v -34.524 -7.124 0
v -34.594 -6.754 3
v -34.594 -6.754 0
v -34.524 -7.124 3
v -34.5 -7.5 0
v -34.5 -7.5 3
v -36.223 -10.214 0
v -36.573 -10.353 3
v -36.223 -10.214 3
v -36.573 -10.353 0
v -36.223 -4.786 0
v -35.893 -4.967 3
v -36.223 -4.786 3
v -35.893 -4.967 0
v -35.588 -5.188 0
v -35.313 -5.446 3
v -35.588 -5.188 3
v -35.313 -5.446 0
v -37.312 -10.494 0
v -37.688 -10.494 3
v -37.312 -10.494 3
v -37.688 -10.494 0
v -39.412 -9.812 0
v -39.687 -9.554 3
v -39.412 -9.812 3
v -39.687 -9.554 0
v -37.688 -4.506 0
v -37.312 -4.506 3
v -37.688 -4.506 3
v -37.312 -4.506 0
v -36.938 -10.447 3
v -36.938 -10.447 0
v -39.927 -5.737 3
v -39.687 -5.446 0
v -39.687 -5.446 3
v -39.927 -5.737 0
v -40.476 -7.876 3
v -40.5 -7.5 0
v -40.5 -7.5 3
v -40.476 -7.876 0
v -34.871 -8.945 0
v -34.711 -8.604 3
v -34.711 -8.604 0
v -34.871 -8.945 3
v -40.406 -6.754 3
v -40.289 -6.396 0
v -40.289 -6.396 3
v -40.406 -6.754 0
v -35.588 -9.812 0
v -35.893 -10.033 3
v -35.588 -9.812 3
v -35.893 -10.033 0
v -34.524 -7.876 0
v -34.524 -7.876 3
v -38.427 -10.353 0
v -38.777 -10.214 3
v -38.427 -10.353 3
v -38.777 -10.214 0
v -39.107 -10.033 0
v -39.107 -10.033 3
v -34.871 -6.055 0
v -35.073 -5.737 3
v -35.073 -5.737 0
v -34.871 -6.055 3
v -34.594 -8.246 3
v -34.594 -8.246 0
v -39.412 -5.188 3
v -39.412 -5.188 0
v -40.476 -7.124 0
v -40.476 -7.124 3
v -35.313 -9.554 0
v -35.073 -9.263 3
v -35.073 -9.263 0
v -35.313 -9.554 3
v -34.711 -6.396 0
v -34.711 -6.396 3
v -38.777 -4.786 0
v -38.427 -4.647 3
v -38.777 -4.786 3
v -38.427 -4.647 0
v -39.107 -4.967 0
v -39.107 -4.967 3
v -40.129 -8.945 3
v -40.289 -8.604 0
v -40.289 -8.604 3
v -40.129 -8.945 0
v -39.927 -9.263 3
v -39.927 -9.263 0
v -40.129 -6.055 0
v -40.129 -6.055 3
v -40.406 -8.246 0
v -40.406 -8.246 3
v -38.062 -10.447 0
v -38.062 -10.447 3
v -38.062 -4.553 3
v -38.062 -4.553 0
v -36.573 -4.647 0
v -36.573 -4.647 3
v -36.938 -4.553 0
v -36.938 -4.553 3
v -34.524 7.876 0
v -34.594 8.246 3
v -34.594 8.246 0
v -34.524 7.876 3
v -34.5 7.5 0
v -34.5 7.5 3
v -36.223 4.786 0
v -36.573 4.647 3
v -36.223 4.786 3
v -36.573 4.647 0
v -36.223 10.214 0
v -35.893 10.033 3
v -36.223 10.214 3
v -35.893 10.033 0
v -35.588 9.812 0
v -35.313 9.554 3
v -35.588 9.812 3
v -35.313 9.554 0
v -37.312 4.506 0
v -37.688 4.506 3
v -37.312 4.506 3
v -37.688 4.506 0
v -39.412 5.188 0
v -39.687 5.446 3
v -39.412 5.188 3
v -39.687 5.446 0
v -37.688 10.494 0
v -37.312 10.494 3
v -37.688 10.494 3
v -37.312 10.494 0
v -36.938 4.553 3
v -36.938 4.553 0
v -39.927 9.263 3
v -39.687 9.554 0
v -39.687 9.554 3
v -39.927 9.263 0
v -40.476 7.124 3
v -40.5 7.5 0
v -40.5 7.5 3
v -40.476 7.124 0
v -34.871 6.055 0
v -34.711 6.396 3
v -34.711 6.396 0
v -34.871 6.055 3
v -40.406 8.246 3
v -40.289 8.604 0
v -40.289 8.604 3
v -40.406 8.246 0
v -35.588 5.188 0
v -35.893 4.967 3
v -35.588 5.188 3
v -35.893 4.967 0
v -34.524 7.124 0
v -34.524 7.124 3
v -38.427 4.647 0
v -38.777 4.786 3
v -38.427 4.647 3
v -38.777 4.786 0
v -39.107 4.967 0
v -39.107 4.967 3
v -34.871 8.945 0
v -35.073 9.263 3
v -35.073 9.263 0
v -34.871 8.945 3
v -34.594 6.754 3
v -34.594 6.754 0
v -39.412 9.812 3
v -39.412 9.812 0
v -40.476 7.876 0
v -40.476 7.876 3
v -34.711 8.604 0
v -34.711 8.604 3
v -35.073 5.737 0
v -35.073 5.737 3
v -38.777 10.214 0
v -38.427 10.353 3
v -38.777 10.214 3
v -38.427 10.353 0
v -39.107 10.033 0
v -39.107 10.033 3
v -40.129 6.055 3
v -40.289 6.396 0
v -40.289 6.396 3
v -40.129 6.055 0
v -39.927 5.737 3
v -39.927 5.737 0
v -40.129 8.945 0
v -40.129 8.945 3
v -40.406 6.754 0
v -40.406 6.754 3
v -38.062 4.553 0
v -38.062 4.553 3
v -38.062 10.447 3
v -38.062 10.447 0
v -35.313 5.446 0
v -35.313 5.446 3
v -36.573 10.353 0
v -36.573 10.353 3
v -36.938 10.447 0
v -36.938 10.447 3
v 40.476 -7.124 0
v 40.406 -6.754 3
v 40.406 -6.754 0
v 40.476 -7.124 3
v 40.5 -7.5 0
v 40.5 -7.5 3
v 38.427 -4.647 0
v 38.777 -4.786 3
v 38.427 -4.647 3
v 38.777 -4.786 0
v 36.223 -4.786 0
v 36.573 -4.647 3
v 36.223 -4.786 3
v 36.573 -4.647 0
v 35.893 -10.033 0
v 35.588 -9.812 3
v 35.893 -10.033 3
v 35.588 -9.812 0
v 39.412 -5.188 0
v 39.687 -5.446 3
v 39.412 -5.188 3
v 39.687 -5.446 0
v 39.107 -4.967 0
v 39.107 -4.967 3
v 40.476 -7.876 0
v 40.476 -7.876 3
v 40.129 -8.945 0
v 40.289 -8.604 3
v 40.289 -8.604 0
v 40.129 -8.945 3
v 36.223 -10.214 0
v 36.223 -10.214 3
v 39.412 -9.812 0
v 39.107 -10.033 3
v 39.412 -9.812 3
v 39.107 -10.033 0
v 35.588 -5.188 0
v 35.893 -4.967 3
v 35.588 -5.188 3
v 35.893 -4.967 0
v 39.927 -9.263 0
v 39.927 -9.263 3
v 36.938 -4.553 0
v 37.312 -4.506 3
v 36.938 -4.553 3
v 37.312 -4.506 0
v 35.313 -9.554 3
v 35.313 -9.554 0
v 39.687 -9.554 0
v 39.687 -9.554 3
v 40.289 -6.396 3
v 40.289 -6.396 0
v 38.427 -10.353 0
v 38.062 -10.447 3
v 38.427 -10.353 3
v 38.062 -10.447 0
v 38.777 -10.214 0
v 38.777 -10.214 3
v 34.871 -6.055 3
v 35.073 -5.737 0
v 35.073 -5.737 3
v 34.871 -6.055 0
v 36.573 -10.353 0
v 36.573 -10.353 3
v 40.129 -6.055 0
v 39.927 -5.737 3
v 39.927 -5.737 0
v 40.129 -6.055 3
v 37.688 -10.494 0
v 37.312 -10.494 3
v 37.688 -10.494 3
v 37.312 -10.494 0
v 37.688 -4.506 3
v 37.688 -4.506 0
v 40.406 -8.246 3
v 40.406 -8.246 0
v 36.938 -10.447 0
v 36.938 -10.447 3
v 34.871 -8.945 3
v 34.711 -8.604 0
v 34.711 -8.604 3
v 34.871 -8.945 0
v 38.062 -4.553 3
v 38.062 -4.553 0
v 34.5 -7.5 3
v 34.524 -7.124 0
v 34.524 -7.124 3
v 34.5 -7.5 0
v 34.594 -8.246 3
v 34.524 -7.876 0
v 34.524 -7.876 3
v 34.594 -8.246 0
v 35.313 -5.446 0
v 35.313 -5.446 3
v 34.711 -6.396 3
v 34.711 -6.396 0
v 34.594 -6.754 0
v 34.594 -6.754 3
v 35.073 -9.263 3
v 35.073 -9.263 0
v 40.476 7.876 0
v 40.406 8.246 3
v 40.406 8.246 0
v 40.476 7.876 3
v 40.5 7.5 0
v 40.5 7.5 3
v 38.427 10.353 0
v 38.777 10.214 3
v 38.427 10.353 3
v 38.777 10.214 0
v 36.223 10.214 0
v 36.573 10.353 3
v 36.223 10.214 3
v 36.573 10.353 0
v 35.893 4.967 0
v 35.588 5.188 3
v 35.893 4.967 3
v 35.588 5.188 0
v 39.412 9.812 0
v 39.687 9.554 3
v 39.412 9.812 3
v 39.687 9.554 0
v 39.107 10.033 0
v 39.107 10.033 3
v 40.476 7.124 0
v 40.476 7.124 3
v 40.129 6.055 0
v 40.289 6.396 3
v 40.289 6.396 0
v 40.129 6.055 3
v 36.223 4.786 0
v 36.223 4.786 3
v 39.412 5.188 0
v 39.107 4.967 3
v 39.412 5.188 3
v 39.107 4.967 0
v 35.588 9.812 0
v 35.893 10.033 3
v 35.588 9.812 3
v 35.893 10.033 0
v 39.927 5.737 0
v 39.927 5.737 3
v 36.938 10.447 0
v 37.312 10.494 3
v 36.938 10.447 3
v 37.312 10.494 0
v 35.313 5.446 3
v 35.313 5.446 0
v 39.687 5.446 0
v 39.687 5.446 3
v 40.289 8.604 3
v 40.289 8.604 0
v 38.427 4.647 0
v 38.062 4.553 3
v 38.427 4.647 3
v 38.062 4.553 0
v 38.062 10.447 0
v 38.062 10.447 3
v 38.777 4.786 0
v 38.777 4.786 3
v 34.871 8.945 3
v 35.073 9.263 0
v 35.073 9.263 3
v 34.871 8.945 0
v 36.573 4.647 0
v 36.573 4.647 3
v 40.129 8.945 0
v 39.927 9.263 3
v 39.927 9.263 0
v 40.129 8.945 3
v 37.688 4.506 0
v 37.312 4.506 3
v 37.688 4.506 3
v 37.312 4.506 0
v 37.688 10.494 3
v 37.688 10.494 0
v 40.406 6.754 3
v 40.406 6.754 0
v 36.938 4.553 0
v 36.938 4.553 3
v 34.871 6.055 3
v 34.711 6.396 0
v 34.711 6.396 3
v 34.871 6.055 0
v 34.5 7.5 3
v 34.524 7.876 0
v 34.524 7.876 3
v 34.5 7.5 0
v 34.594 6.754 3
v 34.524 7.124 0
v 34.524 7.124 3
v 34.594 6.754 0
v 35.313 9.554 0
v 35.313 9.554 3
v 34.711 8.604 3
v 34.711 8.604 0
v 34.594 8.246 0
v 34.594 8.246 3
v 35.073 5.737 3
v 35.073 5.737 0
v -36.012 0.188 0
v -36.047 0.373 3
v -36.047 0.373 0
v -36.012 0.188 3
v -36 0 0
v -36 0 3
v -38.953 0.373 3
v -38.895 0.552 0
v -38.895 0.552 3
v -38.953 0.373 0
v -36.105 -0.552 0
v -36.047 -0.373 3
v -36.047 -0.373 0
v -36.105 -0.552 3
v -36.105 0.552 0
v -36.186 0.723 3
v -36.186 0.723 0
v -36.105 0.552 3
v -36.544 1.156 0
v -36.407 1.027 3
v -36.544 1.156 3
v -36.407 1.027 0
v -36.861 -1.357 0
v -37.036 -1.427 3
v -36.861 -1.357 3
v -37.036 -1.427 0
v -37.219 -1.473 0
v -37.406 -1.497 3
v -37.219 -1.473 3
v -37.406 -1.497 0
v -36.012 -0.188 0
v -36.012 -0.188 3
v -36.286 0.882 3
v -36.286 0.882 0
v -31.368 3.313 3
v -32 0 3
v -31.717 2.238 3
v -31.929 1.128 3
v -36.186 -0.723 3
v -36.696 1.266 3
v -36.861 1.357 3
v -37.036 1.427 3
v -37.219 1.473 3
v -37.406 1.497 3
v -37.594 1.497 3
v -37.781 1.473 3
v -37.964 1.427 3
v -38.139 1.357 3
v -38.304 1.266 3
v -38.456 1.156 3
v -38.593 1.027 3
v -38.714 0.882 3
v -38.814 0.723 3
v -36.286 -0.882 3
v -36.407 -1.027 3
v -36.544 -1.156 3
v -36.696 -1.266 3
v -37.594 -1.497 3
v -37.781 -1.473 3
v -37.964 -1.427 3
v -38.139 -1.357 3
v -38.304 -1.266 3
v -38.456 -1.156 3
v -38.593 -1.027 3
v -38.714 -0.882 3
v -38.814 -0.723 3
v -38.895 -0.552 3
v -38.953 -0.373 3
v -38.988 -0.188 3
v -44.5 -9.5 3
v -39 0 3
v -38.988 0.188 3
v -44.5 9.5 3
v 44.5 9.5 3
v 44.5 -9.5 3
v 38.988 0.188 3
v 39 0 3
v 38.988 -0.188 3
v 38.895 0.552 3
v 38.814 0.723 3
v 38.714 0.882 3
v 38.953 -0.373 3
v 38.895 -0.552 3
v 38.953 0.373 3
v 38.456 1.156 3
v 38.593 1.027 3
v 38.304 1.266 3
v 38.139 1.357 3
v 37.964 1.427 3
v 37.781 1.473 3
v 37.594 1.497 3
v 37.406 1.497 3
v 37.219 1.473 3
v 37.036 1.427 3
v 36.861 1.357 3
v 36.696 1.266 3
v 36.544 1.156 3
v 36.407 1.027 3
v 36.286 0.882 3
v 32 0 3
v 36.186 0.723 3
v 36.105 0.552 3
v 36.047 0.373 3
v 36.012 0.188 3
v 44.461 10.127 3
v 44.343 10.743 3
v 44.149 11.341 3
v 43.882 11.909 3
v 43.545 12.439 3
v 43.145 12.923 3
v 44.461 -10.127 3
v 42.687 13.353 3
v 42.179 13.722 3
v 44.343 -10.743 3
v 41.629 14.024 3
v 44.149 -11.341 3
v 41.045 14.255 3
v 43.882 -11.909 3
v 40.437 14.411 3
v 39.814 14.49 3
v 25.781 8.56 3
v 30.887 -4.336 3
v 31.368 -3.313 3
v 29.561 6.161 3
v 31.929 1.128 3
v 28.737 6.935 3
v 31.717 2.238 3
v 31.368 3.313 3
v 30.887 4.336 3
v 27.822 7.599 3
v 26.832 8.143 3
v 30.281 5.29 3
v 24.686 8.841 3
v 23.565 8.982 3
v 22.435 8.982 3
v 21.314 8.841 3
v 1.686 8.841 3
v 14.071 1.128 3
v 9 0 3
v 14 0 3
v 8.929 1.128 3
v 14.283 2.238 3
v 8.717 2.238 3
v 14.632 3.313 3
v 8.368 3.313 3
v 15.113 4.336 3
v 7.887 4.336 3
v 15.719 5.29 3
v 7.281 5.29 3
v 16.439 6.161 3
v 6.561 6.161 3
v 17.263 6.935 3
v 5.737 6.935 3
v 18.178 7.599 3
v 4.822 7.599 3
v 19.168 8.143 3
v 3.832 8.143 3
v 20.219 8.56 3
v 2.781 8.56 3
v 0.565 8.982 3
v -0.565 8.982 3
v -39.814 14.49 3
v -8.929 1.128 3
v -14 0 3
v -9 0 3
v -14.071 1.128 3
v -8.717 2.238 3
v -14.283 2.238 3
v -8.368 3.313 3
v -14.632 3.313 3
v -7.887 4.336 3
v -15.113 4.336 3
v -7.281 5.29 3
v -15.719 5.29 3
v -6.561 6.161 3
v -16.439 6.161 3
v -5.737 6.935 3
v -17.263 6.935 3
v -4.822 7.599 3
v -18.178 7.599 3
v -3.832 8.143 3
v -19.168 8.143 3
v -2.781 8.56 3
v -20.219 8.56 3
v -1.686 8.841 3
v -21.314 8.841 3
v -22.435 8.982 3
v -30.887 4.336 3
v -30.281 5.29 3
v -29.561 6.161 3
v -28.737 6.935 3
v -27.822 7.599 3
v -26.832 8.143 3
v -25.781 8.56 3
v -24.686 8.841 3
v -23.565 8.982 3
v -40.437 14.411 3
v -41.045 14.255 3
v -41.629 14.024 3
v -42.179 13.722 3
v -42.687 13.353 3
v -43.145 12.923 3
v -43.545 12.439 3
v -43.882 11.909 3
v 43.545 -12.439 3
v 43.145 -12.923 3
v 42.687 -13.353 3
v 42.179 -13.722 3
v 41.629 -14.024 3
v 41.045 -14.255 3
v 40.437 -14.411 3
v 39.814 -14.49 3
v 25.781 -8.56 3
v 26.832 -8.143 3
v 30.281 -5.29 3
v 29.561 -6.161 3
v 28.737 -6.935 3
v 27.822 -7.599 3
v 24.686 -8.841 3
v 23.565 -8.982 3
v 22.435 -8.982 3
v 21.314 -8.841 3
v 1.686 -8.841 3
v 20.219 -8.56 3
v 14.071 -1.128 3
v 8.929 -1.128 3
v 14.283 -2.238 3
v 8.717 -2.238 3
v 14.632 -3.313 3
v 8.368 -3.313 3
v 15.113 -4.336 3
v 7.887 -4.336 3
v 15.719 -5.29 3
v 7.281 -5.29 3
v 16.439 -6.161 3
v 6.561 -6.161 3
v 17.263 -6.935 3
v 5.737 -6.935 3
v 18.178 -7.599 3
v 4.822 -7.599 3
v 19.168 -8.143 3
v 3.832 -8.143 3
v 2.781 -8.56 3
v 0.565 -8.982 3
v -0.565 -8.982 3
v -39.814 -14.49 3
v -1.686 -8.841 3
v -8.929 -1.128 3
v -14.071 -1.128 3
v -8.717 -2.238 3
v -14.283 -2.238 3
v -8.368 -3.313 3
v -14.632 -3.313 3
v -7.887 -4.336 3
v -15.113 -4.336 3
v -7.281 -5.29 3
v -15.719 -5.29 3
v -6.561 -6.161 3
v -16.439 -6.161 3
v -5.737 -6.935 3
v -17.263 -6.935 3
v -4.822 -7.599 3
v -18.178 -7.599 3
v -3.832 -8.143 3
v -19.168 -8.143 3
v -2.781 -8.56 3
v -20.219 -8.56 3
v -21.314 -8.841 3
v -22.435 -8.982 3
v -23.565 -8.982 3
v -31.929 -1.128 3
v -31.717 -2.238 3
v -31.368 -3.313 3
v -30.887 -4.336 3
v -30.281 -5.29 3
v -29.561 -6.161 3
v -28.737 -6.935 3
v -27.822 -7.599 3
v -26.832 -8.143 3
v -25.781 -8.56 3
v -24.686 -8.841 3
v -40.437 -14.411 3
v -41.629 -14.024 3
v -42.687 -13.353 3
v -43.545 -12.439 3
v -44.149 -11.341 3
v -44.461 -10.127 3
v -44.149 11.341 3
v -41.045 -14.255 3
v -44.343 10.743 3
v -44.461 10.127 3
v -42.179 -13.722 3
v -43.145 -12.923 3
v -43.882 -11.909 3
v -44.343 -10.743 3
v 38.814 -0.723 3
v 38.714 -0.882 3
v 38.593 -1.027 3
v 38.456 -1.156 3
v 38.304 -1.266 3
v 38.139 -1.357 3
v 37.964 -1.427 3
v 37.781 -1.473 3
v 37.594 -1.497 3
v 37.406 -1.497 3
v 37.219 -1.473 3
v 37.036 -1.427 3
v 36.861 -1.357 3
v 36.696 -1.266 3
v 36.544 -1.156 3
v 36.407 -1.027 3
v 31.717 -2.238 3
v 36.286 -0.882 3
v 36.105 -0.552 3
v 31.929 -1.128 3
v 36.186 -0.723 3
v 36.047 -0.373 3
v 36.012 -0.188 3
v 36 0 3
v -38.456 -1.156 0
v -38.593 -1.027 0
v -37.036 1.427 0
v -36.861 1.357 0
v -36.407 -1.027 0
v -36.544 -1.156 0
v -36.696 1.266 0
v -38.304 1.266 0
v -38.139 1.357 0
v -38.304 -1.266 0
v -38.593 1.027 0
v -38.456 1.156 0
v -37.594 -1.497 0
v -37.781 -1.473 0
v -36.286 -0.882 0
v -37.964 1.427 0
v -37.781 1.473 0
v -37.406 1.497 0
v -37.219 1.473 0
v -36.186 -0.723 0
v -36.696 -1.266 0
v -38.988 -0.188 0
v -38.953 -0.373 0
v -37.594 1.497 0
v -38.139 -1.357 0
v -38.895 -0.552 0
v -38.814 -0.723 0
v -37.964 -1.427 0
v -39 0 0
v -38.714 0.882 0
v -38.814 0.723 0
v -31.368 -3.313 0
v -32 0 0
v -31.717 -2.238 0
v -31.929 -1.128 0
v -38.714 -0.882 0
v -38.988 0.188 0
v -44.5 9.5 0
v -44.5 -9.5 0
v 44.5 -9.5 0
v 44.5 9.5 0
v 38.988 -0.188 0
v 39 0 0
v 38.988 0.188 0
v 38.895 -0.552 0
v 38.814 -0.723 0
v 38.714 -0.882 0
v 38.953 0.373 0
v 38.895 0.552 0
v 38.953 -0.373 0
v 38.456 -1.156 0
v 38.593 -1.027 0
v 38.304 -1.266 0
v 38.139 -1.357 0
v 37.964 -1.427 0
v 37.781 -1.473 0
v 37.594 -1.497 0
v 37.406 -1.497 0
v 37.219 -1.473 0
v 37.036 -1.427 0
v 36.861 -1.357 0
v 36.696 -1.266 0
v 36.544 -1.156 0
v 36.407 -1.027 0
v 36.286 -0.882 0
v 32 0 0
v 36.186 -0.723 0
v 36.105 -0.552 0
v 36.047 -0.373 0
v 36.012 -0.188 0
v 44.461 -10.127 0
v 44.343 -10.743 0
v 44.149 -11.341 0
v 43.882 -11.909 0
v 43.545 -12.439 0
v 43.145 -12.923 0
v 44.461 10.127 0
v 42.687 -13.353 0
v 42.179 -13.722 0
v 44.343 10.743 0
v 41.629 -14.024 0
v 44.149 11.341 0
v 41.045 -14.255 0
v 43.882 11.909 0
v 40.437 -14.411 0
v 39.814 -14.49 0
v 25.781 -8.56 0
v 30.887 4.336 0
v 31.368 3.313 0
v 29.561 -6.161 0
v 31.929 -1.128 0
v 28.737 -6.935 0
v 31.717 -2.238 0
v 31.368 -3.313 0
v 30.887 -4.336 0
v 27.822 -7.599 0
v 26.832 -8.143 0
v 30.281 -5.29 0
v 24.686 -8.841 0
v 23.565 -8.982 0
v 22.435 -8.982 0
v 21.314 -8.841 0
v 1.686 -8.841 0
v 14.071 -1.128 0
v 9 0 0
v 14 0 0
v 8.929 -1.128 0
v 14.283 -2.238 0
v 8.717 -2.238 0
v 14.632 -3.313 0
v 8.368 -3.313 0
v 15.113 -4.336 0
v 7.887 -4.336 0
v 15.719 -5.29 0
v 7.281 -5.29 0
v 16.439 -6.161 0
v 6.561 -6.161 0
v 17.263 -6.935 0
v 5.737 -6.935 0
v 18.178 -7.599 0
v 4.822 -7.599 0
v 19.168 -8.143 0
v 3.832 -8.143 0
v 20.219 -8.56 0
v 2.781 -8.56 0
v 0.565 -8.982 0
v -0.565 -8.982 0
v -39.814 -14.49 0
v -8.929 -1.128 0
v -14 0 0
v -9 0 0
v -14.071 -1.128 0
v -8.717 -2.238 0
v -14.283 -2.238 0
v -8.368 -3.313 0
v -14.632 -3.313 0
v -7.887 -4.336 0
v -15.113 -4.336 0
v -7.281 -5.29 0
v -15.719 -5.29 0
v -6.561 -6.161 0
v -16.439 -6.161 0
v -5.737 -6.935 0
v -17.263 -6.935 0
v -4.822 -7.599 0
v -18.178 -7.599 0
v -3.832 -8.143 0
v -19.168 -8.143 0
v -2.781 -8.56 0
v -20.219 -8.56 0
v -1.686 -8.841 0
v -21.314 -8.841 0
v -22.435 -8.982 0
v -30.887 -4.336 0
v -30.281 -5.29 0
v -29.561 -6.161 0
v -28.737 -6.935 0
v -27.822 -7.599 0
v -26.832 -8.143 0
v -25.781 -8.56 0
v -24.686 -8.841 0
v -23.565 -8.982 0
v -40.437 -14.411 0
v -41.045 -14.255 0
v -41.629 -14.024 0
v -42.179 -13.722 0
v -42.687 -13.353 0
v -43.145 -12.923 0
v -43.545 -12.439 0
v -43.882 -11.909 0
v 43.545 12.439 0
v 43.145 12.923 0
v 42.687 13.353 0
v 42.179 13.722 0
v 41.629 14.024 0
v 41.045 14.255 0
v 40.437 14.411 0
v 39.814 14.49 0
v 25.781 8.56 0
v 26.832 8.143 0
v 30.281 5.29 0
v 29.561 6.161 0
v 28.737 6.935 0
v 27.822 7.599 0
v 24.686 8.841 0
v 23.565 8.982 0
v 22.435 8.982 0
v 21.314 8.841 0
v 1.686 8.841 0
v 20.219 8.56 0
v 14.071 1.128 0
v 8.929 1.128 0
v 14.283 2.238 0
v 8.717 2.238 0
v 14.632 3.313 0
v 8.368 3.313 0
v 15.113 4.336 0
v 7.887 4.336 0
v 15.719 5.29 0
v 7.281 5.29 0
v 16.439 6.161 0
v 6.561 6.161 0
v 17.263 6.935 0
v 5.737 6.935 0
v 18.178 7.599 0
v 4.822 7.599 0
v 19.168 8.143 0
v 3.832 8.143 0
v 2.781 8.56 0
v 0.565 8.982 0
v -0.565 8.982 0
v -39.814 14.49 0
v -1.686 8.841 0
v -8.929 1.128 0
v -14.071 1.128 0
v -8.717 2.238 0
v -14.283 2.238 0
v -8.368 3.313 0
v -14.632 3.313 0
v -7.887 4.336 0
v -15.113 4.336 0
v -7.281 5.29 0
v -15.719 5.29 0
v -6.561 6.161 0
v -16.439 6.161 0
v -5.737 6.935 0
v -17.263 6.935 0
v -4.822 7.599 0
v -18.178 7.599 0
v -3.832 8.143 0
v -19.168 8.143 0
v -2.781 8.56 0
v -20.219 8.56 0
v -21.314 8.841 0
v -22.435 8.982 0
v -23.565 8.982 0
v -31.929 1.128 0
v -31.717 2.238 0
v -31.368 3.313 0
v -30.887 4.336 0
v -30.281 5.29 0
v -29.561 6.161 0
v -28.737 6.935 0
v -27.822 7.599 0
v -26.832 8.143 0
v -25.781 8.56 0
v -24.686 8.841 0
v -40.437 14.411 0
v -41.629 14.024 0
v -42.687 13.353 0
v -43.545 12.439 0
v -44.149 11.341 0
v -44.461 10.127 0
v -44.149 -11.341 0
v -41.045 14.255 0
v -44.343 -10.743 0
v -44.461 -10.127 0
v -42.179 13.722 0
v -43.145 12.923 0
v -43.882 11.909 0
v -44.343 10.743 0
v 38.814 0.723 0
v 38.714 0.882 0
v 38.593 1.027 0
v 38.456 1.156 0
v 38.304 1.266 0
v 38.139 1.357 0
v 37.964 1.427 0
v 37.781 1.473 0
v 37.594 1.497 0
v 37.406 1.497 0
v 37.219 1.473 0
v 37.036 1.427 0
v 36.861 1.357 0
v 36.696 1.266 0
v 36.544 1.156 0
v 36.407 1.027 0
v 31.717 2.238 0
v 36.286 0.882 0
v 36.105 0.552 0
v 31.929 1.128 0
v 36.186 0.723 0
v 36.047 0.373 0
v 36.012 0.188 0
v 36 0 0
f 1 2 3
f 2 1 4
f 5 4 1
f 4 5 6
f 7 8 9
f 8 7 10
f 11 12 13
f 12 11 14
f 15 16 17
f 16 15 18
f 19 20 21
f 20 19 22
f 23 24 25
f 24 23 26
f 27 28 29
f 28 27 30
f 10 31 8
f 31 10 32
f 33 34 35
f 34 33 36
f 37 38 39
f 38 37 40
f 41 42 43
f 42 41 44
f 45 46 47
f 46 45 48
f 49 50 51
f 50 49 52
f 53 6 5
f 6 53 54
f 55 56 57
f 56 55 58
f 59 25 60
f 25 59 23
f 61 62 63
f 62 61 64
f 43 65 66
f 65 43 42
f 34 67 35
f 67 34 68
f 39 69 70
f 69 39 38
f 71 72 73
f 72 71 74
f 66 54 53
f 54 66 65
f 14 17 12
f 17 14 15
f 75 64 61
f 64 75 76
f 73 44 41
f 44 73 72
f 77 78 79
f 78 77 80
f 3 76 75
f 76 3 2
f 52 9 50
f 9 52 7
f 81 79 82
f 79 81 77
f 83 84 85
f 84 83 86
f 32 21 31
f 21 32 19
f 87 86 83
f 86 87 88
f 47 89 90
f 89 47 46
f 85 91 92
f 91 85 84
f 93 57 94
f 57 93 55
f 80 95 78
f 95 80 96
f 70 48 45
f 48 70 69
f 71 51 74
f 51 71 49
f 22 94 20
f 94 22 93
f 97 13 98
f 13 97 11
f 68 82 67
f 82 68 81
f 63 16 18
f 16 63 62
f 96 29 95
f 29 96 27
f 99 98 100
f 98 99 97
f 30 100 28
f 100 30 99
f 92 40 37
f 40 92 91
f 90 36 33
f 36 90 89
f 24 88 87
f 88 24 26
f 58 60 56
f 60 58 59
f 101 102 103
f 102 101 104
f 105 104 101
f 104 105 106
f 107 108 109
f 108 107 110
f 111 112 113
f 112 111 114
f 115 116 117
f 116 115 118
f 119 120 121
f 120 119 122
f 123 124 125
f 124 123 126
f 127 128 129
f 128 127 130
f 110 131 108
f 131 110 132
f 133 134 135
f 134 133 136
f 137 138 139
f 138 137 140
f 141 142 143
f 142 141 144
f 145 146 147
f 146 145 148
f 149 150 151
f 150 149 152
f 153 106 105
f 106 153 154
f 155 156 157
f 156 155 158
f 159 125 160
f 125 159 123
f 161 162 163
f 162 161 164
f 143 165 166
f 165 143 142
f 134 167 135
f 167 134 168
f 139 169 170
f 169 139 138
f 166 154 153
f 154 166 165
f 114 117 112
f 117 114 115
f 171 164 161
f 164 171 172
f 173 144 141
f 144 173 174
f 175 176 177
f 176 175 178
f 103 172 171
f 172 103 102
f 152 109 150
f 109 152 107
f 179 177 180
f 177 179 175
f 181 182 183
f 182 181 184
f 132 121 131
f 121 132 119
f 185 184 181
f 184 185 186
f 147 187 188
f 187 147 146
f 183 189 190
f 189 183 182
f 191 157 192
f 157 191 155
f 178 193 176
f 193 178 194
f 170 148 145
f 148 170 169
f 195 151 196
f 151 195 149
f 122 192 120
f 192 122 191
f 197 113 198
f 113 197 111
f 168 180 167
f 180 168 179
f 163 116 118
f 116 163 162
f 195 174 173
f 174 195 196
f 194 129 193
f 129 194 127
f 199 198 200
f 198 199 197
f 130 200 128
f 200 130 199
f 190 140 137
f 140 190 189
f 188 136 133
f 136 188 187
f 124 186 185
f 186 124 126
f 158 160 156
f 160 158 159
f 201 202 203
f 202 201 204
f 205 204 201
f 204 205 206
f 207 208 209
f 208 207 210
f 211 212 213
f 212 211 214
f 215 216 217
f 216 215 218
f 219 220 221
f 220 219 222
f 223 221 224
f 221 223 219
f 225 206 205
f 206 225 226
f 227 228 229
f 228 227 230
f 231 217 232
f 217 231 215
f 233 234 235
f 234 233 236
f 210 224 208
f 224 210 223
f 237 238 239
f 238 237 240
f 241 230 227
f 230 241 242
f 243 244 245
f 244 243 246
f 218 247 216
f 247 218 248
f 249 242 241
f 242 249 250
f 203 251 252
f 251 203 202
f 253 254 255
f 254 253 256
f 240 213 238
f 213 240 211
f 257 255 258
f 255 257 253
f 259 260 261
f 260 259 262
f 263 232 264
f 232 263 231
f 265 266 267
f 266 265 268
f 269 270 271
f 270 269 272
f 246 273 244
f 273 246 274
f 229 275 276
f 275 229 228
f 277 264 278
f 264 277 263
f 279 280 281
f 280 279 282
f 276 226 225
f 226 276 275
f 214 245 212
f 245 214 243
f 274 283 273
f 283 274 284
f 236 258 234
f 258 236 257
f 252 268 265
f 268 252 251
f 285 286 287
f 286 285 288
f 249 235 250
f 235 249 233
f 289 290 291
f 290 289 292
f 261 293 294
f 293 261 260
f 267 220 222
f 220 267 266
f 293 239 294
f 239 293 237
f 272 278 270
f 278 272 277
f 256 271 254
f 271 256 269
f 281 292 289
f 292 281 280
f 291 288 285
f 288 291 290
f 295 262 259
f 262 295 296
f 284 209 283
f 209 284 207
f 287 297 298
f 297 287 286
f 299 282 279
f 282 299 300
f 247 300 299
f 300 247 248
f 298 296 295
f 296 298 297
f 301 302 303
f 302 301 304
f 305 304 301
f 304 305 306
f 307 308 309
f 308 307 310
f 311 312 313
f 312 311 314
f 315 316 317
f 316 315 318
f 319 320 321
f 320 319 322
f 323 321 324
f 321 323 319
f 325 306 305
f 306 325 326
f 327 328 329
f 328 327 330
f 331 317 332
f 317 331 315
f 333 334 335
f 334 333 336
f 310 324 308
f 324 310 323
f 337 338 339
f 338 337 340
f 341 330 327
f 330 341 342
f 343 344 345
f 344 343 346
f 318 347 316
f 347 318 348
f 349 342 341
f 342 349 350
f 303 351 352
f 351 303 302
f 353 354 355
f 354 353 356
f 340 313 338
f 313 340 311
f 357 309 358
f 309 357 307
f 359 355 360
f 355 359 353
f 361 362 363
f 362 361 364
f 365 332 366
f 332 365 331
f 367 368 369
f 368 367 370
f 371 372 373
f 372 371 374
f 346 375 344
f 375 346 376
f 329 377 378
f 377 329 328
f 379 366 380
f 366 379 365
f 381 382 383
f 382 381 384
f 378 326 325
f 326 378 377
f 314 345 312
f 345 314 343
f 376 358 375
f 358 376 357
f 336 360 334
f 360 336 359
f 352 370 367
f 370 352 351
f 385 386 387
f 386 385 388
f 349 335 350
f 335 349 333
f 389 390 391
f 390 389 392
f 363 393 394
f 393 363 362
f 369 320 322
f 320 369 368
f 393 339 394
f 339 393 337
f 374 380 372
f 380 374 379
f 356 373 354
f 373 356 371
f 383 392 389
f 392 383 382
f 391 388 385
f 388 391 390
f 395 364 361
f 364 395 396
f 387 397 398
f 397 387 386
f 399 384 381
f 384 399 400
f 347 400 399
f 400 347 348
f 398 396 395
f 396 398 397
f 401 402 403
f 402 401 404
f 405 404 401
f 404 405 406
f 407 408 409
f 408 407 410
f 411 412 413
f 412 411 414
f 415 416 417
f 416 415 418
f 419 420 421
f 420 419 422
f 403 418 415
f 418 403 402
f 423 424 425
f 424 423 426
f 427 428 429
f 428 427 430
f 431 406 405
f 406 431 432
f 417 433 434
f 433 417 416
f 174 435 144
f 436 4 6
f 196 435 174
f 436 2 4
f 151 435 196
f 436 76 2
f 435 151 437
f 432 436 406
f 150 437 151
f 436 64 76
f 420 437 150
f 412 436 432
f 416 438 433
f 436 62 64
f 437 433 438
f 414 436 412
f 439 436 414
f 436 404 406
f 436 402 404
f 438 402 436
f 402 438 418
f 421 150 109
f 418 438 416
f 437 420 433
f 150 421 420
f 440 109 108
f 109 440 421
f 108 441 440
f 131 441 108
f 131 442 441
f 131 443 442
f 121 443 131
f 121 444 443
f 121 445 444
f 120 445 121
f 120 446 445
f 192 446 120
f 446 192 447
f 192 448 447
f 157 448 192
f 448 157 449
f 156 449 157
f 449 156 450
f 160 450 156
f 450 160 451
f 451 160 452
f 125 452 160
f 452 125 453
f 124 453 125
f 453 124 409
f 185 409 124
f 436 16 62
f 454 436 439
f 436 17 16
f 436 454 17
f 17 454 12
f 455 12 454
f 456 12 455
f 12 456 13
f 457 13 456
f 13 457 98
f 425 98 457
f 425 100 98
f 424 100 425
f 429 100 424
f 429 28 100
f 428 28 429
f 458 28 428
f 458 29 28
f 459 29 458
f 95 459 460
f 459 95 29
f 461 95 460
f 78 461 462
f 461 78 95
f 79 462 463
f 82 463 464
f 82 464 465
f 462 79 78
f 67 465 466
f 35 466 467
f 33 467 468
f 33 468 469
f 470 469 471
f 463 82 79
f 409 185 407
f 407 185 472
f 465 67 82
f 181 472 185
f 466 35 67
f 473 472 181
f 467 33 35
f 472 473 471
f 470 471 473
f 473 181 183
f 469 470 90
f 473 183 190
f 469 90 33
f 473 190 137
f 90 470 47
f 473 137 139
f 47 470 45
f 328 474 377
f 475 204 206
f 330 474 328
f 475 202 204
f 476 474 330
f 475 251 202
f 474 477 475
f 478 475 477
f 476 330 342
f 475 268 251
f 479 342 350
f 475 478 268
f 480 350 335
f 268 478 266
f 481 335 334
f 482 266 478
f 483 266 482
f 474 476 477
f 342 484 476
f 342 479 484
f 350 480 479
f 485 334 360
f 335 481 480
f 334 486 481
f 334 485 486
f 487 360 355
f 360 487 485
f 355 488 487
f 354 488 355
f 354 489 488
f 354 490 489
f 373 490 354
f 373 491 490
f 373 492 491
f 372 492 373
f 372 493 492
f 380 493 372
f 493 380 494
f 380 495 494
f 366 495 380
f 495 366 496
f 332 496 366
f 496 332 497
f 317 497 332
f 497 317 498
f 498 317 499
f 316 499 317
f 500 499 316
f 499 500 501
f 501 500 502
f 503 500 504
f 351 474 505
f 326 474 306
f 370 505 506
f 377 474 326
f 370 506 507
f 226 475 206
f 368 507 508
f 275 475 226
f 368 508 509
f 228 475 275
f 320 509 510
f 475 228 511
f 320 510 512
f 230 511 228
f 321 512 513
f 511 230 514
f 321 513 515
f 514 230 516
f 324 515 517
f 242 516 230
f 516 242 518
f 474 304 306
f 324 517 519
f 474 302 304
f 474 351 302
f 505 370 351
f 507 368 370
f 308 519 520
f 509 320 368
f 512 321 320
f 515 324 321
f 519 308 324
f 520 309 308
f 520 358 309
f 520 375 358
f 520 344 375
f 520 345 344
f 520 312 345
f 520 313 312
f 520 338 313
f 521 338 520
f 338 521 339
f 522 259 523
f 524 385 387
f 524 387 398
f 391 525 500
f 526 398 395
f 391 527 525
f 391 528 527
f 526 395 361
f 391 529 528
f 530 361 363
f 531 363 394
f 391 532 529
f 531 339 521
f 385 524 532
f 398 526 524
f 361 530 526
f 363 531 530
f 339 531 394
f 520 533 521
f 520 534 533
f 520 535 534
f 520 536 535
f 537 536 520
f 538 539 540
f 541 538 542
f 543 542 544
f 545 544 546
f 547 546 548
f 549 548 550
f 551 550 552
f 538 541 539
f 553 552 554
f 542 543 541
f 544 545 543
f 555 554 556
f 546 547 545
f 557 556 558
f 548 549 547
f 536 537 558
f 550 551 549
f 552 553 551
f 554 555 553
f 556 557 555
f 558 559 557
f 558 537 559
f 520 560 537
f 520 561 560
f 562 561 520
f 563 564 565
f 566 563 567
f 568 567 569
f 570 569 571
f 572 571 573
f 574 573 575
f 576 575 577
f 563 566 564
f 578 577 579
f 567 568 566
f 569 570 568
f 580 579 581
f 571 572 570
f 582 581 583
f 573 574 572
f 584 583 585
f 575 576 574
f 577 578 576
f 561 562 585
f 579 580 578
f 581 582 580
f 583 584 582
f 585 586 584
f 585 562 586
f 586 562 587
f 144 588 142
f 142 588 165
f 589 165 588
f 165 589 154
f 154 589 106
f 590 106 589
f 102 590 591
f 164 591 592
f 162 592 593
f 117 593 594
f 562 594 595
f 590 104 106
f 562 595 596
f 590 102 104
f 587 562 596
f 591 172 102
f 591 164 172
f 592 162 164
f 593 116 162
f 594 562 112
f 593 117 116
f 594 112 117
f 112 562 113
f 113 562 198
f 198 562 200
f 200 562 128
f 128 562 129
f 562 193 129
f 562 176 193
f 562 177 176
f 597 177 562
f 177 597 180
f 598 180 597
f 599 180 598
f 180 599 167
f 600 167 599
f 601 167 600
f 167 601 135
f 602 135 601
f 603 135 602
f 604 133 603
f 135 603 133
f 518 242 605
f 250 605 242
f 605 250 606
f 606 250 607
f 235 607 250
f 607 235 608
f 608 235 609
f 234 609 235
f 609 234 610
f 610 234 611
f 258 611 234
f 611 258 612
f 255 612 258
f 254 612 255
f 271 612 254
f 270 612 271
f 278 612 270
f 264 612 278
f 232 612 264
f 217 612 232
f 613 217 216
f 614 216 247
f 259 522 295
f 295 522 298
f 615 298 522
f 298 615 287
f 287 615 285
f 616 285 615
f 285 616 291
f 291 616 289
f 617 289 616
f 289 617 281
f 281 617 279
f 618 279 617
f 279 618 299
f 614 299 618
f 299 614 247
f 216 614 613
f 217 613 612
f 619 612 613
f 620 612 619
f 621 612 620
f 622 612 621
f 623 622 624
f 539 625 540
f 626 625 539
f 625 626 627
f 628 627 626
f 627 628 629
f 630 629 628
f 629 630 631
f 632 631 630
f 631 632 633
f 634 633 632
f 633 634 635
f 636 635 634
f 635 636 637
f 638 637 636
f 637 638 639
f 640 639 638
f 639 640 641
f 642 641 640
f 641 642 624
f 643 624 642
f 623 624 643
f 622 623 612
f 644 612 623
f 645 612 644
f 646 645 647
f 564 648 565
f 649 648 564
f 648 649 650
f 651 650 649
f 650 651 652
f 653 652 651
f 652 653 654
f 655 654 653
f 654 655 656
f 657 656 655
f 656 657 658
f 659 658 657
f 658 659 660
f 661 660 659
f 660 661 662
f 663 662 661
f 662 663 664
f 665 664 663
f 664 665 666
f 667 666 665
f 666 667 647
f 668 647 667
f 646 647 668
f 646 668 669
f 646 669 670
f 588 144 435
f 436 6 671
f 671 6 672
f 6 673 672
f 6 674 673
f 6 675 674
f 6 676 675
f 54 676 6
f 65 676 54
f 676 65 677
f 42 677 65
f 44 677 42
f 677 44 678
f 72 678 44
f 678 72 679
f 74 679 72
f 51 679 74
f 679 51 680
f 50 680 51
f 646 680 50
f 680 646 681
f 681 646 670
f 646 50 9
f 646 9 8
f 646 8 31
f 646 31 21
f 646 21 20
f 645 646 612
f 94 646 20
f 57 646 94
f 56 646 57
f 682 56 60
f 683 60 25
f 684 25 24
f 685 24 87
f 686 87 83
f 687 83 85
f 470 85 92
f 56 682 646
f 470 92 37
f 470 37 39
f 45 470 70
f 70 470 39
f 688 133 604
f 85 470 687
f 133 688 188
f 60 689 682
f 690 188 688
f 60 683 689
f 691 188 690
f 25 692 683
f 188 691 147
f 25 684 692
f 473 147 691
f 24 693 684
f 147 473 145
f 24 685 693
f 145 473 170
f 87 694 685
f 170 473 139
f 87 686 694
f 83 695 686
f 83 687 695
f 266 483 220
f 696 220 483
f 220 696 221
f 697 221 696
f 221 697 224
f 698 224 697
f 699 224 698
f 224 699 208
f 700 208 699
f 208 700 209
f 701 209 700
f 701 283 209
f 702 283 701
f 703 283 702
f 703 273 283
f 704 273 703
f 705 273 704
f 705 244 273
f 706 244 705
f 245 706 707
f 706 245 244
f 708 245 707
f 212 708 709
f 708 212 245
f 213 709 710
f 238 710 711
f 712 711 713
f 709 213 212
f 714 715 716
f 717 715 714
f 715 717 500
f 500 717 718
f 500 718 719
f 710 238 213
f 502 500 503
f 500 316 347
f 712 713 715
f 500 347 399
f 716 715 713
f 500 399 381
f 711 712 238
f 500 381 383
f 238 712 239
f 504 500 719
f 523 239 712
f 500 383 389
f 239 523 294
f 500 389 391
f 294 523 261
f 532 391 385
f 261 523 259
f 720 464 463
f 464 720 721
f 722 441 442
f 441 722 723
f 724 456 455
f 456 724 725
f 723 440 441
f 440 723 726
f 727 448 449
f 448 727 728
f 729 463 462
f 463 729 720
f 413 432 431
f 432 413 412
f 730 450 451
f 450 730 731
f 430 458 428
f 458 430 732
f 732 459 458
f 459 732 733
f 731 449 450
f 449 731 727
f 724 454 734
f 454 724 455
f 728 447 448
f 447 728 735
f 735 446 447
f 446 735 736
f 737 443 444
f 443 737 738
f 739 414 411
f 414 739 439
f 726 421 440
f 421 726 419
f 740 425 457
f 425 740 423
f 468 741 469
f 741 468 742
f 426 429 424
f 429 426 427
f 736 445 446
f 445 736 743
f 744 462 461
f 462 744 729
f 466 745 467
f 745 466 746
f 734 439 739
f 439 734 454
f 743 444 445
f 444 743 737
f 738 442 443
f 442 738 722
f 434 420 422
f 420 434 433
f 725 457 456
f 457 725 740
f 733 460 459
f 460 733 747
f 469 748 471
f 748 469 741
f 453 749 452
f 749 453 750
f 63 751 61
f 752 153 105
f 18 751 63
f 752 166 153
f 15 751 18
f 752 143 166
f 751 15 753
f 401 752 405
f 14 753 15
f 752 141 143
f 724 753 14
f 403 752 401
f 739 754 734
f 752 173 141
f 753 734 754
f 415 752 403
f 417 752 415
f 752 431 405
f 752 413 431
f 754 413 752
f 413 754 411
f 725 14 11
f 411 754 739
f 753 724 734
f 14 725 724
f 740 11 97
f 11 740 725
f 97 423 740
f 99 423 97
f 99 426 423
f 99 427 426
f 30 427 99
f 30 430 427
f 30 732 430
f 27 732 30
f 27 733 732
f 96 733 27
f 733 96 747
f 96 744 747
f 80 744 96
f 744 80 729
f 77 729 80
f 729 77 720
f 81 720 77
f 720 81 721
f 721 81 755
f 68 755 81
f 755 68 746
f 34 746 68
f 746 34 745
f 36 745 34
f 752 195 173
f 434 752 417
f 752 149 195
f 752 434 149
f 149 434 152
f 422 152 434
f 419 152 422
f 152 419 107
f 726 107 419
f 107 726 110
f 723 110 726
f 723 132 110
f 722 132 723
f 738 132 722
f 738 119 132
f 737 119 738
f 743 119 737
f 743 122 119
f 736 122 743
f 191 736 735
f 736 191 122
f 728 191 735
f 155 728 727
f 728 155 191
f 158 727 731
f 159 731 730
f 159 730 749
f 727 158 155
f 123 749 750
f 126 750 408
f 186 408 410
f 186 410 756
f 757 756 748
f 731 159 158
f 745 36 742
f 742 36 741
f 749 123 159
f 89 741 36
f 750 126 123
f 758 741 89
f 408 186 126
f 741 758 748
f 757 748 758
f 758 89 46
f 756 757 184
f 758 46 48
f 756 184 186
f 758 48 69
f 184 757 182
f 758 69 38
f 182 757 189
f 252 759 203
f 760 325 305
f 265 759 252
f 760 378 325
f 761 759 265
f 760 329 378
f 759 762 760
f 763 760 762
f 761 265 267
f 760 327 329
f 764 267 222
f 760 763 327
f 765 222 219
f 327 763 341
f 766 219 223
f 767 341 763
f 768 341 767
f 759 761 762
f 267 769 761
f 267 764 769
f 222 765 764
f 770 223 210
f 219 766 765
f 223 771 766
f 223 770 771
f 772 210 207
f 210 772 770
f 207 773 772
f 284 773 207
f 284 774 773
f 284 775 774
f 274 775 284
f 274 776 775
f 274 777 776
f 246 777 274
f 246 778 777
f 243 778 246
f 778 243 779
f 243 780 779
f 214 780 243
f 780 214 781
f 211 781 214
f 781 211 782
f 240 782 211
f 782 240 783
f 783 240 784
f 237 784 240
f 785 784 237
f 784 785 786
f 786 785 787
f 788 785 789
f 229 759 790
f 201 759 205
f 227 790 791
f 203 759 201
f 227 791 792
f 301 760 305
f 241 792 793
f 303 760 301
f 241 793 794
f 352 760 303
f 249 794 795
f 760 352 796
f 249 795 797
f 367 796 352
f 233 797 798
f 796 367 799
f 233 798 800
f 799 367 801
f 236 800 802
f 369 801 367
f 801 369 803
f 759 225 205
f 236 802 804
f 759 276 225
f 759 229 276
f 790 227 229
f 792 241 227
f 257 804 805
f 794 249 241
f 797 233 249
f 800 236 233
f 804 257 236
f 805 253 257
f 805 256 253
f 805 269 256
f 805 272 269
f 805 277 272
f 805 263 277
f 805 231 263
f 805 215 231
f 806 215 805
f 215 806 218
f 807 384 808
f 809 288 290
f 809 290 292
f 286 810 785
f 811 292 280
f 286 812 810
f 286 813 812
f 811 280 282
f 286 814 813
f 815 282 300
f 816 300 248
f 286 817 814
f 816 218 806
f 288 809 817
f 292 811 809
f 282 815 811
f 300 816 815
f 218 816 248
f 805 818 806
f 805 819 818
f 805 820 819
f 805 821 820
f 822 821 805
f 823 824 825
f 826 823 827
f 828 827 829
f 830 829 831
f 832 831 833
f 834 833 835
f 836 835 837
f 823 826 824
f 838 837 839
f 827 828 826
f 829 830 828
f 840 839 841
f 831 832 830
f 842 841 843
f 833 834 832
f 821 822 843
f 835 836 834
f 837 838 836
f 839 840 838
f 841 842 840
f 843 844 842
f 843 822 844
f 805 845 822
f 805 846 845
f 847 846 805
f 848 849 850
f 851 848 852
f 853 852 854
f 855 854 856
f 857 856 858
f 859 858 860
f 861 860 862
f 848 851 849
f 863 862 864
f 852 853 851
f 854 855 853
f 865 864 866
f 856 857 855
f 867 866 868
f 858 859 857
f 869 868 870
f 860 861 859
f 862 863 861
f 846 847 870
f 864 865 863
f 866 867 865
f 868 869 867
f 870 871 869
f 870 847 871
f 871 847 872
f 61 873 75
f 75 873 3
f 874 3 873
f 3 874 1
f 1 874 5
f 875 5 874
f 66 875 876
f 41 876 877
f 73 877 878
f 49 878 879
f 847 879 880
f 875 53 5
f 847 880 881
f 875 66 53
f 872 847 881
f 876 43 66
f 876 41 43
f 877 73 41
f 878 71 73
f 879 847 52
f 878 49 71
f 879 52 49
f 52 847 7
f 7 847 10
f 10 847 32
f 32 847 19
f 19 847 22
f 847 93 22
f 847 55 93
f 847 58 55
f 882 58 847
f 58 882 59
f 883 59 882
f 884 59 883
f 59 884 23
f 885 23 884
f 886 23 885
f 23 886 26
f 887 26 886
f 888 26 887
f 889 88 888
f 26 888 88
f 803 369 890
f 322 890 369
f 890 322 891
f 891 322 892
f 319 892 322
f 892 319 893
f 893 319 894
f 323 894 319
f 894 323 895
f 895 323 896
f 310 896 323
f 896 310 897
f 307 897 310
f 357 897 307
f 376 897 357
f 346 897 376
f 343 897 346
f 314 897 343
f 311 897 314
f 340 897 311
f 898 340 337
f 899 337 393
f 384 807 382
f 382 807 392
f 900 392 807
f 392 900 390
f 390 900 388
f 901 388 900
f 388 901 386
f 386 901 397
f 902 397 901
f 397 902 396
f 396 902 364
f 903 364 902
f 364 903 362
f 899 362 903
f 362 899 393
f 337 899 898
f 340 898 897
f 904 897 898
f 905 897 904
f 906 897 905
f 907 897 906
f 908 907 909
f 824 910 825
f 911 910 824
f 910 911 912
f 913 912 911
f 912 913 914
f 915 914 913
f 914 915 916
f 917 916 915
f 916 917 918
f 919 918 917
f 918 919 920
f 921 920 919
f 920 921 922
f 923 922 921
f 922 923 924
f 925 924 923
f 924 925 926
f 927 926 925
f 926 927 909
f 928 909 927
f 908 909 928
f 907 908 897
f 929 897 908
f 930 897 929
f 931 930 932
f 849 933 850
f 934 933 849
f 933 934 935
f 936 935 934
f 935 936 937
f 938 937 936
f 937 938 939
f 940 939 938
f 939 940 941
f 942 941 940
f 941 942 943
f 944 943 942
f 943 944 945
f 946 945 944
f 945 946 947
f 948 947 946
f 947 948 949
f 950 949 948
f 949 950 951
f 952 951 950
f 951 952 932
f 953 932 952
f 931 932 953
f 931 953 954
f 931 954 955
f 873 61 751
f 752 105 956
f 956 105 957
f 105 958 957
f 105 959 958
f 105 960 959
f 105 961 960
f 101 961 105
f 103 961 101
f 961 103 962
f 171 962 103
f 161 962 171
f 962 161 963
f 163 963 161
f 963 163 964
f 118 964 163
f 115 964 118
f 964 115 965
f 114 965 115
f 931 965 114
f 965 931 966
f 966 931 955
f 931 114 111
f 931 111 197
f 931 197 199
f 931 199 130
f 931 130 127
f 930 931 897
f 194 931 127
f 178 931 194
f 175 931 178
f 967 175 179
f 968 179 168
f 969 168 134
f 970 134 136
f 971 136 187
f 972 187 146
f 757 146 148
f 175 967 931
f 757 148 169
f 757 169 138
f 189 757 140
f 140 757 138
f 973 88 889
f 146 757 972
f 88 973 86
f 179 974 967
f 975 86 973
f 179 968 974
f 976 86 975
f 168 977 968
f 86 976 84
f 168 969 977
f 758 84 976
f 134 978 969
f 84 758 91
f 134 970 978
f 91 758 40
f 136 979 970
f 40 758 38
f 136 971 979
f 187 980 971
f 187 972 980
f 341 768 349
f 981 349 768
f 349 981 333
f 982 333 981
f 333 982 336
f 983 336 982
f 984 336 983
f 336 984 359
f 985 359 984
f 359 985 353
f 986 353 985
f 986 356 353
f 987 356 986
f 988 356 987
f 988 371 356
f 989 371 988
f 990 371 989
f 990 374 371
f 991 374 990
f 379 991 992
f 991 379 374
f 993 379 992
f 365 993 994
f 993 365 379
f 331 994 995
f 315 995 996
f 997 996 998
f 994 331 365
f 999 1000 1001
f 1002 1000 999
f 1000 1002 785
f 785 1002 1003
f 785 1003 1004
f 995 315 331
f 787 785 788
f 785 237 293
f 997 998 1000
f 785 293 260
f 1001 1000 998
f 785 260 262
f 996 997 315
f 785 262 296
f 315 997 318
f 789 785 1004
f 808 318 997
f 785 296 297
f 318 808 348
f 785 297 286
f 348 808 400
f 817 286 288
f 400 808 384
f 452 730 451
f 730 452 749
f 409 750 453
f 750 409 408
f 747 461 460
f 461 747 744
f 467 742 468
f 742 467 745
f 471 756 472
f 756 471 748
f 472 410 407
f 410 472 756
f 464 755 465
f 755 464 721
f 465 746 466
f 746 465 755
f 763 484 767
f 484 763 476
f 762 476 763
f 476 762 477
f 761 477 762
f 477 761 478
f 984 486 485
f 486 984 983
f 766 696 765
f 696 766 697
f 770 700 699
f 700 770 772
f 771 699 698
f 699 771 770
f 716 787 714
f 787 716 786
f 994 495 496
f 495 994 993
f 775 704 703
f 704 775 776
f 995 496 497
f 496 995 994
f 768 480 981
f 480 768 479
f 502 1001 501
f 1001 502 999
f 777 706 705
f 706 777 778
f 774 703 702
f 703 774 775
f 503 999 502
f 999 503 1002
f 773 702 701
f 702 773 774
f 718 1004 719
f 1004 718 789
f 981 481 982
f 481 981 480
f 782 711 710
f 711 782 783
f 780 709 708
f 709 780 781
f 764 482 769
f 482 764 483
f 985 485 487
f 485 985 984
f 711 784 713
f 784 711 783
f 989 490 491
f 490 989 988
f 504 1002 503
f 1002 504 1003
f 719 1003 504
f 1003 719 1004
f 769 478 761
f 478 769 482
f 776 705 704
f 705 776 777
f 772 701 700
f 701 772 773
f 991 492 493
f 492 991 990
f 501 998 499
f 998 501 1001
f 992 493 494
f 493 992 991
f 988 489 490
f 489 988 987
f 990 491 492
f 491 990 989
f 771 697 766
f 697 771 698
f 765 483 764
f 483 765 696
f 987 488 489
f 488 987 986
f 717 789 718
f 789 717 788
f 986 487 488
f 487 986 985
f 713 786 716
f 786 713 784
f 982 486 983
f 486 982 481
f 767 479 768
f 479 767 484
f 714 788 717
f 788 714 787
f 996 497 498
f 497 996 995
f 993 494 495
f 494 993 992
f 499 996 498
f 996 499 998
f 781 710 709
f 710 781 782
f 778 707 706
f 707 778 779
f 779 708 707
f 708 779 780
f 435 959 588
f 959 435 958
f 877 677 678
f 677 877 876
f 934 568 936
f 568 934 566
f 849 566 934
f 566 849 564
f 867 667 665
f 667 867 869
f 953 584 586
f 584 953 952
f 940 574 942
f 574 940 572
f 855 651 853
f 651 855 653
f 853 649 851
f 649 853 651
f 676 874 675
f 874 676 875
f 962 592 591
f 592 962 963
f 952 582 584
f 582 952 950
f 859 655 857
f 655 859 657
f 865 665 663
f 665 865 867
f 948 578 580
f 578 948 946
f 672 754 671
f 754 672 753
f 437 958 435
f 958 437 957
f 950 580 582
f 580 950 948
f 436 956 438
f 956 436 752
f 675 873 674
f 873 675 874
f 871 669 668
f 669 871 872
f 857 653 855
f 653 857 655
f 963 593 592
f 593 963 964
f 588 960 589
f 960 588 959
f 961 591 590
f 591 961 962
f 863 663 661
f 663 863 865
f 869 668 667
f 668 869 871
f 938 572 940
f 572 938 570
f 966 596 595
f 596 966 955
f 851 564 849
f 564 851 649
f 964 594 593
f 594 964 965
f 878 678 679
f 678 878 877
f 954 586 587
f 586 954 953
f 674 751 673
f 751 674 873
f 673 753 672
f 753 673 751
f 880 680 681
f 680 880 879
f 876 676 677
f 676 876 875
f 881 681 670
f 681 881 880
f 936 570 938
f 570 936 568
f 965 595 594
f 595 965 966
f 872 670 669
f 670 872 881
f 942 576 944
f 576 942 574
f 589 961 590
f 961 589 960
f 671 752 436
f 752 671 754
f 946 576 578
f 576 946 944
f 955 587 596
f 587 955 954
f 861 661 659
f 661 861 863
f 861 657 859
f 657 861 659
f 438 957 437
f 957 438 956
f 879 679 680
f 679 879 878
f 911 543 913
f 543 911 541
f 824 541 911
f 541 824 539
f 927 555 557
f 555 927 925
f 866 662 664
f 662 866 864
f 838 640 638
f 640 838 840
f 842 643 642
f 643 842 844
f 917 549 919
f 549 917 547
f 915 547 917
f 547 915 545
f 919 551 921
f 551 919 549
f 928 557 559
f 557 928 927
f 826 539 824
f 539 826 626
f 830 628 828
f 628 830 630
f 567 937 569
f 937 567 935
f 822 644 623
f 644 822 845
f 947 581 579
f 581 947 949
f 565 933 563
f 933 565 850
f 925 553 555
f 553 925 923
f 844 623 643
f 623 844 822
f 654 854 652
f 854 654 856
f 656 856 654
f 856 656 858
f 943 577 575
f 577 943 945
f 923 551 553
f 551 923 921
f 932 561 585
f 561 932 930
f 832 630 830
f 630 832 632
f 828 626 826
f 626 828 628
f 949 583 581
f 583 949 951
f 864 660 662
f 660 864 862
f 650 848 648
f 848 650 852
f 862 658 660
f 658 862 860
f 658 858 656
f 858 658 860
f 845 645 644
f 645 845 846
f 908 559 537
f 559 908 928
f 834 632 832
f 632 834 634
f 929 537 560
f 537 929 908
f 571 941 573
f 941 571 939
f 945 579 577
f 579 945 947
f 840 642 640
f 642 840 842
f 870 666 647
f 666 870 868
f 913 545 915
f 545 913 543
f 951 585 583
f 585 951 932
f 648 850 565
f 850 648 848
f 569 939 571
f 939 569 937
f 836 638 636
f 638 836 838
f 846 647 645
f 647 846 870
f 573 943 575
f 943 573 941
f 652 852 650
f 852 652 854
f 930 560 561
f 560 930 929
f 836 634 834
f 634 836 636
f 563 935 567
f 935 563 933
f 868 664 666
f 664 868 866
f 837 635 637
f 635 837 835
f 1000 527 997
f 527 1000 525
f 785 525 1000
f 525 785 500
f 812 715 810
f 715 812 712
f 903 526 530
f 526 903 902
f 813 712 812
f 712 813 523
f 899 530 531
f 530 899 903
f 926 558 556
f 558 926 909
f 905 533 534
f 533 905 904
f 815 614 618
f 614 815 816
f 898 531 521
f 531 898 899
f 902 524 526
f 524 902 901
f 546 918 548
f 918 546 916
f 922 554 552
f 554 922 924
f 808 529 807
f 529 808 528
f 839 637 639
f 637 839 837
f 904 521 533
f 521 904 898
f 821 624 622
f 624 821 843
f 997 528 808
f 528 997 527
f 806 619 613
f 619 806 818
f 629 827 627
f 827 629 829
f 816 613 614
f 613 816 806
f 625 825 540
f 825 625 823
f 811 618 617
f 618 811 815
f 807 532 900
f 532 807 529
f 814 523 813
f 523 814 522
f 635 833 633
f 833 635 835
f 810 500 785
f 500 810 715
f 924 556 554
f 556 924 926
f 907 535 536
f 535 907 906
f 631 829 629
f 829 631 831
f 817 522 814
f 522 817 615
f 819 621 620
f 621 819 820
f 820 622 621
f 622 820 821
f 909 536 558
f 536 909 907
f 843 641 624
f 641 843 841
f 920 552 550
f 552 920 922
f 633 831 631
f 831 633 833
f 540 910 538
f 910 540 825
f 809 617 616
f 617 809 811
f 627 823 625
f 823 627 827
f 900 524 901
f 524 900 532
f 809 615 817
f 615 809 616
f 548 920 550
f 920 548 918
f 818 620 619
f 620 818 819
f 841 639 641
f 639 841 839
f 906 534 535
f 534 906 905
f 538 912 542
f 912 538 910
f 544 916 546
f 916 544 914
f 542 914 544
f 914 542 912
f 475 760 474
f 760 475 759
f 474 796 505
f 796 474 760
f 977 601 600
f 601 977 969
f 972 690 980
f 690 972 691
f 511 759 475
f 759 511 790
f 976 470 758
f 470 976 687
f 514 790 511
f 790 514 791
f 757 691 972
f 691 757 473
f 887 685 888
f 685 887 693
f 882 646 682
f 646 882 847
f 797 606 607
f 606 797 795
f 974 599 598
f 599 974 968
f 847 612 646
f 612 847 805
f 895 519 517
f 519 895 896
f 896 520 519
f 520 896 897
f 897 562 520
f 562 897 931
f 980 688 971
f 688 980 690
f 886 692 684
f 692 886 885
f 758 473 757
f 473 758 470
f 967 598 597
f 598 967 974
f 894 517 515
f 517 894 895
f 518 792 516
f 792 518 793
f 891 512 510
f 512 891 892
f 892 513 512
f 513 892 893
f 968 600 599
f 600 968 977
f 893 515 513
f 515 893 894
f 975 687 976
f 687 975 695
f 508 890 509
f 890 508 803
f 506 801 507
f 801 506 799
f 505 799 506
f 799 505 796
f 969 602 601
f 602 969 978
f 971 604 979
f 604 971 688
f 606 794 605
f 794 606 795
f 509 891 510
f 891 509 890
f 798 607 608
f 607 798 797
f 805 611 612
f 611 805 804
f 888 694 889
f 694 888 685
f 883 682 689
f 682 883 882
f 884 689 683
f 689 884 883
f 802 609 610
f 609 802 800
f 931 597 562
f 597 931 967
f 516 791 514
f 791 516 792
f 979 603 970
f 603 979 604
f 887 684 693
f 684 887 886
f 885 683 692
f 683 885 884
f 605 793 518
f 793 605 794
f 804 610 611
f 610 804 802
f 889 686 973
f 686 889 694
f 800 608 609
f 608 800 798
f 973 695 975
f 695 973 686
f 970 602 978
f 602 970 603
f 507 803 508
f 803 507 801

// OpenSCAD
$fn = 50;


difference() {
	union() {
		hull() {
			translate(v = [-39.5000000000, 9.5000000000, 0]) {
				cylinder(h = 3, r = 5);
			}
			translate(v = [39.5000000000, 9.5000000000, 0]) {
				cylinder(h = 3, r = 5);
			}
			translate(v = [-39.5000000000, -9.5000000000, 0]) {
				cylinder(h = 3, r = 5);
			}
			translate(v = [39.5000000000, -9.5000000000, 0]) {
				cylinder(h = 3, r = 5);
			}
		}
	}
	union() {
		#translate(v = [-37.5000000000, -7.5000000000, 0]) {
			cylinder(h = 3, r = 3.0000000000);
		}
		#translate(v = [-37.5000000000, 7.5000000000, 0]) {
			cylinder(h = 3, r = 3.0000000000);
		}
		#translate(v = [37.5000000000, -7.5000000000, 0]) {
			cylinder(h = 3, r = 3.0000000000);
		}
		#translate(v = [37.5000000000, 7.5000000000, 0]) {
			cylinder(h = 3, r = 3.0000000000);
		}
		#translate(v = [-37.5000000000, -7.5000000000, -100.0000000000]) {
			cylinder(h = 200, r = 3.0000000000);
		}
		#translate(v = [-37.5000000000, 7.5000000000, -100.0000000000]) {
			cylinder(h = 200, r = 3.0000000000);
		}
		#translate(v = [37.5000000000, -7.5000000000, -100.0000000000]) {
			cylinder(h = 200, r = 3.0000000000);
		}
		#translate(v = [37.5000000000, 7.5000000000, -100.0000000000]) {
			cylinder(h = 200, r = 3.0000000000);
		}
		#translate(v = [-37.5000000000, -7.5000000000, 0]) {
			cylinder(h = 3, r = 1.5000000000);
		}
		#translate(v = [-37.5000000000, 0.0000000000, 0]) {
			cylinder(h = 3, r = 1.5000000000);
		}
		#translate(v = [-37.5000000000, 7.5000000000, 0]) {
			cylinder(h = 3, r = 1.5000000000);
		}
		#translate(v = [37.5000000000, -7.5000000000, 0]) {
			cylinder(h = 3, r = 1.5000000000);
		}
		#translate(v = [37.5000000000, 0.0000000000, 0]) {
			cylinder(h = 3, r = 1.5000000000);
		}
		#translate(v = [37.5000000000, 7.5000000000, 0]) {
			cylinder(h = 3, r = 1.5000000000);
		}
		#translate(v = [-37.5000000000, -7.5000000000, 0]) {
			cylinder(h = 3, r = 1.5000000000);
		}
		#translate(v = [-37.5000000000, 0.0000000000, 0]) {
			cylinder(h = 3, r = 1.5000000000);
		}
		#translate(v = [-37.5000000000, 7.5000000000, 0]) {
			cylinder(h = 3, r = 1.5000000000);
		}
		#translate(v = [37.5000000000, -7.5000000000, 0]) {
			cylinder(h = 3, r = 1.5000000000);
		}
		#translate(v = [37.5000000000, 0.0000000000, 0]) {
			cylinder(h = 3, r = 1.5000000000);
		}
		#translate(v = [37.5000000000, 7.5000000000, 0]) {
			cylinder(h = 3, r = 1.5000000000);
		}
		#translate(v = [-37.5000000000, -7.5000000000, 0]) {
			cylinder(h = 3, r = 1.5000000000);
		}
		#translate(v = [-37.5000000000, 0.0000000000, 0]) {
			cylinder(h = 3, r = 1.5000000000);
		}
		#translate(v = [-37.5000000000, 7.5000000000, 0]) {
			cylinder(h = 3, r = 1.5000000000);
		}
		#translate(v = [37.5000000000, -7.5000000000, 0]) {
			cylinder(h = 3, r = 1.5000000000);
		}
		#translate(v = [37.5000000000, 0.0000000000, 0]) {
			cylinder(h = 3, r = 1.5000000000);
		}
		#translate(v = [37.5000000000, 7.5000000000, 0]) {
			cylinder(h = 3, r = 1.5000000000);
		}
		#translate(v = [-23.0000000000, 0, 0]) {
			cylinder(h = 3, r = 9.0000000000);
		}
		#cylinder(h = 3, r = 9.0000000000);
		#translate(v = [23.0000000000, 0, 0]) {
			cylinder(h = 3, r = 9.0000000000);
		}
	}
}
